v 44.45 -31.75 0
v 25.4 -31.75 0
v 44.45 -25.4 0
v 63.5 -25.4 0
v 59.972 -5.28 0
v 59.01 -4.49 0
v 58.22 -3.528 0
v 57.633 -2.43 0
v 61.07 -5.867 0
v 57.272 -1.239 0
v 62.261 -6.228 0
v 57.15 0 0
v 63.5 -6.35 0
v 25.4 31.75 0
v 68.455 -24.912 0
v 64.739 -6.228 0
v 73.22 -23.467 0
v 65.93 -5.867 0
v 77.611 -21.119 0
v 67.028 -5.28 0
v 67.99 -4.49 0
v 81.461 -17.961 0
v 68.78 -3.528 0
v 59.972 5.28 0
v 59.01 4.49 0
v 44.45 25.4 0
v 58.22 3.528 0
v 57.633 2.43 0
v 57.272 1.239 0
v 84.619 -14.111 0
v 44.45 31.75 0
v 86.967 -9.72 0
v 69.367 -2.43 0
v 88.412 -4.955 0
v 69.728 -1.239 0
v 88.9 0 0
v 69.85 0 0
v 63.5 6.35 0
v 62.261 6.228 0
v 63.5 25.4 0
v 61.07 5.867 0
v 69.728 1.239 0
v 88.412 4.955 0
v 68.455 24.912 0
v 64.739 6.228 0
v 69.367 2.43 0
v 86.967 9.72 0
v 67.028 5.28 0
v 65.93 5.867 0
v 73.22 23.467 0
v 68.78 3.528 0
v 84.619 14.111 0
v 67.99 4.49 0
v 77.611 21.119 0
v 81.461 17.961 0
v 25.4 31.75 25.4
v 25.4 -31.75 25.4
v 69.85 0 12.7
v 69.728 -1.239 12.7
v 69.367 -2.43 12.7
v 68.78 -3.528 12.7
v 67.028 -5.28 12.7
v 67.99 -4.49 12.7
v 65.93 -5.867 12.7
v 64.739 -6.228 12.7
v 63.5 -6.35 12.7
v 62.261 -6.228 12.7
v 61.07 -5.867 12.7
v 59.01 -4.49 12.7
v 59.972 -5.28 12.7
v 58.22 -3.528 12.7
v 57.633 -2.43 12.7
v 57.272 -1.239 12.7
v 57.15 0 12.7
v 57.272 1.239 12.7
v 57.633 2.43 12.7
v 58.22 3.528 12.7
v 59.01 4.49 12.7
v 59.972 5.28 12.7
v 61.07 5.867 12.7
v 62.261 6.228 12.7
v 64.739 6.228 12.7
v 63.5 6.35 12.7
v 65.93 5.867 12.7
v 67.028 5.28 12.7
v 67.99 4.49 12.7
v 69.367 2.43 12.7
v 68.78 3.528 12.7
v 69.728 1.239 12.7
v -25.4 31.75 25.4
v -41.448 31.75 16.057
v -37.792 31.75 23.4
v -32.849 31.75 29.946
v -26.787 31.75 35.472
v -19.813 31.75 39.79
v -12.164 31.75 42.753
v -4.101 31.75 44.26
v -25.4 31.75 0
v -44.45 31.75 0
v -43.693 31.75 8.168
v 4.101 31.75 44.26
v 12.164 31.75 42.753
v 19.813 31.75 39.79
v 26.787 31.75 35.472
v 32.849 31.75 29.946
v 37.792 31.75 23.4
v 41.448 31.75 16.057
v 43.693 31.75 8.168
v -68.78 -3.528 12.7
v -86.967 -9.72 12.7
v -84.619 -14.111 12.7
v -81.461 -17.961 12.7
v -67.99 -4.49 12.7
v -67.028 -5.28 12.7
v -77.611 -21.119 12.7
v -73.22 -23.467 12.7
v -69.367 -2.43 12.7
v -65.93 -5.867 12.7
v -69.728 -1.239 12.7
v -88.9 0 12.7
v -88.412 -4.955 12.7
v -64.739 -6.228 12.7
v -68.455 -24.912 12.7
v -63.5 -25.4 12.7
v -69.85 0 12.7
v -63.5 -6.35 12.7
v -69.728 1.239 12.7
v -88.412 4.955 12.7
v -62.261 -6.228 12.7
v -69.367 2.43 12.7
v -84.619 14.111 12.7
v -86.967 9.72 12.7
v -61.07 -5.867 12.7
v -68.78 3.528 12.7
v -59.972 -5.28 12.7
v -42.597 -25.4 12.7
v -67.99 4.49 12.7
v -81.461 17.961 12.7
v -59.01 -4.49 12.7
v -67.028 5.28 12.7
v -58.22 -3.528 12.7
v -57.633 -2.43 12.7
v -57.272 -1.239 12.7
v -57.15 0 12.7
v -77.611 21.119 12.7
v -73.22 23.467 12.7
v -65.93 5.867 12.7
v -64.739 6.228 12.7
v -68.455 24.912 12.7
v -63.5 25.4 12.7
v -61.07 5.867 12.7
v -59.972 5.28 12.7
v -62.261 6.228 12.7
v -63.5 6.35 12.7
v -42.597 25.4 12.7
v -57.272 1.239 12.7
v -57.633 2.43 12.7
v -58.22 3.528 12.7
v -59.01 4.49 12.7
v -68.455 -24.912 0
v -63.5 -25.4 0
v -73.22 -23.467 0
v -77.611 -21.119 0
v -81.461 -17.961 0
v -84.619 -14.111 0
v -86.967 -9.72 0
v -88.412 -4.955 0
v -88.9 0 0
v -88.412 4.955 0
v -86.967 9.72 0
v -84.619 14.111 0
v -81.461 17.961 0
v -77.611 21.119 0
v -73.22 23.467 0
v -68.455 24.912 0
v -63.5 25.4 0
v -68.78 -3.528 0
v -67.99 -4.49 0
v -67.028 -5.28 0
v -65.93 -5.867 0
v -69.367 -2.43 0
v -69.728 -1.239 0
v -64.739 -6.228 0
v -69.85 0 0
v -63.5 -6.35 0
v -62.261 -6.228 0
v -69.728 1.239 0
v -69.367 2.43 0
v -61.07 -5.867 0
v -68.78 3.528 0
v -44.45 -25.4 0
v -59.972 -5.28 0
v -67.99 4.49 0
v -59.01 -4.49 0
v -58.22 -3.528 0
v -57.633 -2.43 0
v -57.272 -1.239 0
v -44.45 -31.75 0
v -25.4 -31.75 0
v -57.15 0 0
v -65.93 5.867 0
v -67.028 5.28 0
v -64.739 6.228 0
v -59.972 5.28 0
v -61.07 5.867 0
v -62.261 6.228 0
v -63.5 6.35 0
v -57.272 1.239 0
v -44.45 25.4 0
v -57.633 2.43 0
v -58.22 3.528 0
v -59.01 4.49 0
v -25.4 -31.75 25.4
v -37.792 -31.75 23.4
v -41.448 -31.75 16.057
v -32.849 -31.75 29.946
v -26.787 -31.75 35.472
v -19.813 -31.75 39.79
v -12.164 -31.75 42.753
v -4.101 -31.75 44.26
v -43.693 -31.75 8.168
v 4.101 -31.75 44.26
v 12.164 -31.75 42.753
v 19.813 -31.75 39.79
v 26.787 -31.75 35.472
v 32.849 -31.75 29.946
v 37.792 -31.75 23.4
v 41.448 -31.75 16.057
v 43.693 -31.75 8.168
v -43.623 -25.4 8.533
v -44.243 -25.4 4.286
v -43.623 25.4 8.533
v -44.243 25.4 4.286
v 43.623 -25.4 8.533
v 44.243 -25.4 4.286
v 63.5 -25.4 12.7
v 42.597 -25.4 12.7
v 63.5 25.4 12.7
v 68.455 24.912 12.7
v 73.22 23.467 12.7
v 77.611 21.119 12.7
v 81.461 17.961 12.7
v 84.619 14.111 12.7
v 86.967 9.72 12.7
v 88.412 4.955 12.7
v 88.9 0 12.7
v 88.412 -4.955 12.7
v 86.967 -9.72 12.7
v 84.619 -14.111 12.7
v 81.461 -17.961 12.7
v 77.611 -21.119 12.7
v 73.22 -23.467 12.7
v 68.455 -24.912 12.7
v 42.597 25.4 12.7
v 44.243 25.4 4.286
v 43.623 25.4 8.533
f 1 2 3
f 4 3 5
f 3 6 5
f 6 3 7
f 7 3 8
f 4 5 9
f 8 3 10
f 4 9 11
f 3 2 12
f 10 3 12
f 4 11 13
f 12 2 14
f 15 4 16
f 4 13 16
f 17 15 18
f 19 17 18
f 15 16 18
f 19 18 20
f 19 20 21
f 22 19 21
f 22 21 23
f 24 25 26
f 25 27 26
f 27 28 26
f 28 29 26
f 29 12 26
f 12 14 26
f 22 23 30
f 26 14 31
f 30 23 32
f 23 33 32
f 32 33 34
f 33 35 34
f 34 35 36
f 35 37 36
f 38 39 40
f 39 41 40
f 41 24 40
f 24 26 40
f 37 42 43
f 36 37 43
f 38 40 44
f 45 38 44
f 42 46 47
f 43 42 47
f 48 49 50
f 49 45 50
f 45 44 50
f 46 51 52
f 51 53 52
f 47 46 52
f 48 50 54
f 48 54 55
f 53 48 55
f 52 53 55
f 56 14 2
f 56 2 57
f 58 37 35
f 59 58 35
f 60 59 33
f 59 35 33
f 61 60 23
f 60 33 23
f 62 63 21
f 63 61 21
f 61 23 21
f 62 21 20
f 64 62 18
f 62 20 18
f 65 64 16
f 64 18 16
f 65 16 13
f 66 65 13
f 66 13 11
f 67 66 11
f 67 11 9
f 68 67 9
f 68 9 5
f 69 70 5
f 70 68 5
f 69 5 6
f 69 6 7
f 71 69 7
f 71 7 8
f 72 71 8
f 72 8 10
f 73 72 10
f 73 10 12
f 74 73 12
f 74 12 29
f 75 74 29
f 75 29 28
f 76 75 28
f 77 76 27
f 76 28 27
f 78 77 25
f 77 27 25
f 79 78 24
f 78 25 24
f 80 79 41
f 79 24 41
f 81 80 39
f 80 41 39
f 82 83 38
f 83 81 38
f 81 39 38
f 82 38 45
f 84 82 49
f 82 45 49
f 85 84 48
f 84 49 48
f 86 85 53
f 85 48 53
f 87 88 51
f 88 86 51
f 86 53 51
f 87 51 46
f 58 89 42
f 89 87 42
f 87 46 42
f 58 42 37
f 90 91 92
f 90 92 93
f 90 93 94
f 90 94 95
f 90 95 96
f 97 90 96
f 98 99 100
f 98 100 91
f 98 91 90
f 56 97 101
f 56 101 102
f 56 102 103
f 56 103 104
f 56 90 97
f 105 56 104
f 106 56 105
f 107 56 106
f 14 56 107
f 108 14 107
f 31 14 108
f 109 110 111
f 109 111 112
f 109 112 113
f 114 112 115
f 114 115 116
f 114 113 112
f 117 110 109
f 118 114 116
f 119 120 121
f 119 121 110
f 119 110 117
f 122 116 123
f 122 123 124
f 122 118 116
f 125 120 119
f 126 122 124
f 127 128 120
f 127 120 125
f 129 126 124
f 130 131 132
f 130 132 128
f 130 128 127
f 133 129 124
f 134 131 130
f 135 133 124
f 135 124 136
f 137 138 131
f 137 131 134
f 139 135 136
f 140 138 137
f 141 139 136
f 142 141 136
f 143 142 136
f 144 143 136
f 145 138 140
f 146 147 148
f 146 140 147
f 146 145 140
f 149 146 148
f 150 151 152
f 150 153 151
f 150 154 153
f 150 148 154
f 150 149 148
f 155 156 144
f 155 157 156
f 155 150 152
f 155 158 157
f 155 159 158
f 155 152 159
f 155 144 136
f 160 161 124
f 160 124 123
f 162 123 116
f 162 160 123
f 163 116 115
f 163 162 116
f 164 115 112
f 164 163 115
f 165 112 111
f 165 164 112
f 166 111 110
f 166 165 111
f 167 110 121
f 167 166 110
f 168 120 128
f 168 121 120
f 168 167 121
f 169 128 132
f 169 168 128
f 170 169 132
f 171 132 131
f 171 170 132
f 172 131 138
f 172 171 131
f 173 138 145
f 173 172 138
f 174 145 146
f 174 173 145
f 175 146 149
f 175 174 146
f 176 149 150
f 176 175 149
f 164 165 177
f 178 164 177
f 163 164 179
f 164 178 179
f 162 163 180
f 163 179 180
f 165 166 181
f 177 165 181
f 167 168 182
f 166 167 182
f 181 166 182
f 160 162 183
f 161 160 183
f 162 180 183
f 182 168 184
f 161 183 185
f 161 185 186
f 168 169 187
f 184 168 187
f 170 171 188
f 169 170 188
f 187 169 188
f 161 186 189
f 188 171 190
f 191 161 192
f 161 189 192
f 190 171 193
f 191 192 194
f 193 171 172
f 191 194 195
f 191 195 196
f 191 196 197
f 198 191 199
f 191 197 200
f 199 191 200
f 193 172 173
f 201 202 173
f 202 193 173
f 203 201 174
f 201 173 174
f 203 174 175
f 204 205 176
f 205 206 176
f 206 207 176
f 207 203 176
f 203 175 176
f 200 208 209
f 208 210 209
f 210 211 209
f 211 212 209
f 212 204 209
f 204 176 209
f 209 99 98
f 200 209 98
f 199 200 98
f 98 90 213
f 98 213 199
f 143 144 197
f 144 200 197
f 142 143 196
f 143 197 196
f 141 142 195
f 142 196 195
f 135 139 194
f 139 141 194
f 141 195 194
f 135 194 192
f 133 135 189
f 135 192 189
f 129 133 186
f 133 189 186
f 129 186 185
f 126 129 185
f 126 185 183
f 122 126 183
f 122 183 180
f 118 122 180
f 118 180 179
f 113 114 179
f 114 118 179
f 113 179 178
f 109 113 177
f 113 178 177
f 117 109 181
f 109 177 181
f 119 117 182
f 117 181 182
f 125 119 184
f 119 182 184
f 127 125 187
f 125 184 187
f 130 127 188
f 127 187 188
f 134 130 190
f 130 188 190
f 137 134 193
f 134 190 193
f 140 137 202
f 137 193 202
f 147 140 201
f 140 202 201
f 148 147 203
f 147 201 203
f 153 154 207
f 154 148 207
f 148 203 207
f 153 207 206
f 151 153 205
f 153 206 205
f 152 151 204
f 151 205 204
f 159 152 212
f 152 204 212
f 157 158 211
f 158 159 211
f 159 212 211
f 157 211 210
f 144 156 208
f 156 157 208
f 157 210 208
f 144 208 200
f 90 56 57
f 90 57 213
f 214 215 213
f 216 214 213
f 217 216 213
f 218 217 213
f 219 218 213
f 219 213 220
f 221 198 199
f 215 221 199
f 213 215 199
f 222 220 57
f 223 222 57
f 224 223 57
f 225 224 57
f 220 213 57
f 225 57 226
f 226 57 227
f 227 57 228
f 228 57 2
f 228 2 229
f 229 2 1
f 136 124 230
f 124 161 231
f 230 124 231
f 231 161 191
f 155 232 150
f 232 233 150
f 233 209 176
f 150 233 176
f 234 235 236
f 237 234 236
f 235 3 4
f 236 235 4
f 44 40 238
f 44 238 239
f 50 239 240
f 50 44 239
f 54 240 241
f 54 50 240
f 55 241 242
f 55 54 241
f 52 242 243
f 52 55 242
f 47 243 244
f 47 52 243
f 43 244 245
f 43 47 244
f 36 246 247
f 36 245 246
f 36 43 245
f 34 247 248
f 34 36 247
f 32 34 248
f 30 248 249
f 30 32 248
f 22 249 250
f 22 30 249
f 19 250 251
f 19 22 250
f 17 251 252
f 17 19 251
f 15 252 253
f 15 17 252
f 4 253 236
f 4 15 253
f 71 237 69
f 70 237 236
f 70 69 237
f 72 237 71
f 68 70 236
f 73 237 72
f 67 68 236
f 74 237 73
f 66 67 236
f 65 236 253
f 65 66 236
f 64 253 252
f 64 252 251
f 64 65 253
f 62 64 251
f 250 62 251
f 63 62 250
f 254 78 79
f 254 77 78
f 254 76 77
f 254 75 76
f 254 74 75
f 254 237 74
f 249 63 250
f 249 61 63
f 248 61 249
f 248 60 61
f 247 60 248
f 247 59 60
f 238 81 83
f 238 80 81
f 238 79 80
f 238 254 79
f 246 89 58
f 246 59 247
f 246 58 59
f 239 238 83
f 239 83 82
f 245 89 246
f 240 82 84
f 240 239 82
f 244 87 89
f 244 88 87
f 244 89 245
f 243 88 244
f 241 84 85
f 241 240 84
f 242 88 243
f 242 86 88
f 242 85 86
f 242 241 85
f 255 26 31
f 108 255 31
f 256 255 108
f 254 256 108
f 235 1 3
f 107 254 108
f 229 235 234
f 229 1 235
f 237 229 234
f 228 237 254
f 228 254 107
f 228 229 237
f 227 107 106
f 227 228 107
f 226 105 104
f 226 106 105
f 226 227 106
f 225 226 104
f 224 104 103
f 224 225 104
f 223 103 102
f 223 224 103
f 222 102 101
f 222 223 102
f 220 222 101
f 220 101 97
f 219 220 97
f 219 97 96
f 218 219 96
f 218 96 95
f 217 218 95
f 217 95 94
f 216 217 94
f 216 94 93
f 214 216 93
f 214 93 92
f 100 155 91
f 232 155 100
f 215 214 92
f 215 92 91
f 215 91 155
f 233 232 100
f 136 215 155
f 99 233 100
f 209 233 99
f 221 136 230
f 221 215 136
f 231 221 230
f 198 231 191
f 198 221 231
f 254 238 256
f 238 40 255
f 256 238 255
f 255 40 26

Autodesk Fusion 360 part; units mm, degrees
sketch "Sketch1" plane through (0, 0, 0) normal (0, 0, 1) x (1, 0, 0) in component "u-Bracket"
  line L0 (-63.5, -25.4) -> (63.5, -25.4)
  arc A0 (63.5, -25.4) -> (63.5, 25.4) centre (63.5, 0) ccw
  line L1 (63.5, 25.4) -> (-63.5, 25.4)
  arc A1 (-63.5, 25.4) -> (-63.5, -25.4) centre (-63.5, 0) ccw
  line L2 (-63.5, 0) -> (63.5, 0) construction
  circle A2 centre (63.5, 0) radius 6.35
  circle A3 centre (-63.5, 0) radius 6.35
  dimension "d1" = 127
  dimension "d2" = 12.7
  dimension "d3" = 12.7
  dimension "d4" = 25.4
  dimension "d5" = 63.5
extrude "Extrude2" add sketch "Sketch1" along normal blind 12.7 makes body 1 in component "u-Bracket"
extrude "Extrude1" add sketch "Sketch1" along normal blind 12.7 separate body makes body 2 in component "u-Bracket"
sketch "Sketch2" plane through (0, 0, 0) normal (0, 1, 0) x (1, 0, 0) in component "u-Bracket"
  circle A0 centre (0, 0) radius 44.45
  line L0 (-44.45, 0) -> (44.45, 0)
  dimension "d10" = 88.9
extrude "Extrude3" add sketch "Sketch2" along normal mid plane 63.5 contours A0 L0 picked at (-7.4083, -12.8316) bodies 1 2 in component "u-Bracket"
sketch "Sketch3" plane through (0, -31.75, 0) normal (0, -1, 0) x (1, 0, 0) in component "u-Bracket"
  arc A0 (44.45, 0) -> (-44.45, 0) centre (0, 0) ccw
  line L0 (-44.45, 0) -> (44.45, 0)
  line L1 (-25.4, 0) -> (25.4, 0)
  line L2 (25.4, 0) -> (25.4, 25.4)
  line L3 (25.4, 25.4) -> (-25.4, 25.4)
  line L4 (-25.4, 25.4) -> (-25.4, 0)
  line L5 (-63.5, 0) -> (63.5, 0)
  dimension "d13" = 50.8
  dimension "d14" = 25.4
extrude "Extrude4" cut sketch "Sketch3" against normal through all contours L0 L1 L2 L3 L4 L5 bodies 1 in component "u-Bracket"
sketch "Sketch4" plane through (0, 0, 25.4) normal (0, 0, -1) x (1, 0, 0) in component "u-Bracket"
  line L0 (-25.4, -31.75) -> (25.4, -31.75)
  line L1 (25.4, -31.75) -> (25.4, 31.75)
  line L2 (25.4, 31.75) -> (-25.4, 31.75)
  line L3 (-25.4, 31.75) -> (-25.4, -31.75)
  circle A0 centre (0, 0) radius 3.175
  dimension "d16" = 6.35
extrude "Extrude5" cut sketch "Sketch4" along normal through all contours A0 bodies 1 in component "u-Bracket"
component "u-Bracket" placed x (1, 0, 0) y (0, 1, 0) z (0, 0, 1) at (0, 0, 0)
equation "d5 = d1 / 2"
